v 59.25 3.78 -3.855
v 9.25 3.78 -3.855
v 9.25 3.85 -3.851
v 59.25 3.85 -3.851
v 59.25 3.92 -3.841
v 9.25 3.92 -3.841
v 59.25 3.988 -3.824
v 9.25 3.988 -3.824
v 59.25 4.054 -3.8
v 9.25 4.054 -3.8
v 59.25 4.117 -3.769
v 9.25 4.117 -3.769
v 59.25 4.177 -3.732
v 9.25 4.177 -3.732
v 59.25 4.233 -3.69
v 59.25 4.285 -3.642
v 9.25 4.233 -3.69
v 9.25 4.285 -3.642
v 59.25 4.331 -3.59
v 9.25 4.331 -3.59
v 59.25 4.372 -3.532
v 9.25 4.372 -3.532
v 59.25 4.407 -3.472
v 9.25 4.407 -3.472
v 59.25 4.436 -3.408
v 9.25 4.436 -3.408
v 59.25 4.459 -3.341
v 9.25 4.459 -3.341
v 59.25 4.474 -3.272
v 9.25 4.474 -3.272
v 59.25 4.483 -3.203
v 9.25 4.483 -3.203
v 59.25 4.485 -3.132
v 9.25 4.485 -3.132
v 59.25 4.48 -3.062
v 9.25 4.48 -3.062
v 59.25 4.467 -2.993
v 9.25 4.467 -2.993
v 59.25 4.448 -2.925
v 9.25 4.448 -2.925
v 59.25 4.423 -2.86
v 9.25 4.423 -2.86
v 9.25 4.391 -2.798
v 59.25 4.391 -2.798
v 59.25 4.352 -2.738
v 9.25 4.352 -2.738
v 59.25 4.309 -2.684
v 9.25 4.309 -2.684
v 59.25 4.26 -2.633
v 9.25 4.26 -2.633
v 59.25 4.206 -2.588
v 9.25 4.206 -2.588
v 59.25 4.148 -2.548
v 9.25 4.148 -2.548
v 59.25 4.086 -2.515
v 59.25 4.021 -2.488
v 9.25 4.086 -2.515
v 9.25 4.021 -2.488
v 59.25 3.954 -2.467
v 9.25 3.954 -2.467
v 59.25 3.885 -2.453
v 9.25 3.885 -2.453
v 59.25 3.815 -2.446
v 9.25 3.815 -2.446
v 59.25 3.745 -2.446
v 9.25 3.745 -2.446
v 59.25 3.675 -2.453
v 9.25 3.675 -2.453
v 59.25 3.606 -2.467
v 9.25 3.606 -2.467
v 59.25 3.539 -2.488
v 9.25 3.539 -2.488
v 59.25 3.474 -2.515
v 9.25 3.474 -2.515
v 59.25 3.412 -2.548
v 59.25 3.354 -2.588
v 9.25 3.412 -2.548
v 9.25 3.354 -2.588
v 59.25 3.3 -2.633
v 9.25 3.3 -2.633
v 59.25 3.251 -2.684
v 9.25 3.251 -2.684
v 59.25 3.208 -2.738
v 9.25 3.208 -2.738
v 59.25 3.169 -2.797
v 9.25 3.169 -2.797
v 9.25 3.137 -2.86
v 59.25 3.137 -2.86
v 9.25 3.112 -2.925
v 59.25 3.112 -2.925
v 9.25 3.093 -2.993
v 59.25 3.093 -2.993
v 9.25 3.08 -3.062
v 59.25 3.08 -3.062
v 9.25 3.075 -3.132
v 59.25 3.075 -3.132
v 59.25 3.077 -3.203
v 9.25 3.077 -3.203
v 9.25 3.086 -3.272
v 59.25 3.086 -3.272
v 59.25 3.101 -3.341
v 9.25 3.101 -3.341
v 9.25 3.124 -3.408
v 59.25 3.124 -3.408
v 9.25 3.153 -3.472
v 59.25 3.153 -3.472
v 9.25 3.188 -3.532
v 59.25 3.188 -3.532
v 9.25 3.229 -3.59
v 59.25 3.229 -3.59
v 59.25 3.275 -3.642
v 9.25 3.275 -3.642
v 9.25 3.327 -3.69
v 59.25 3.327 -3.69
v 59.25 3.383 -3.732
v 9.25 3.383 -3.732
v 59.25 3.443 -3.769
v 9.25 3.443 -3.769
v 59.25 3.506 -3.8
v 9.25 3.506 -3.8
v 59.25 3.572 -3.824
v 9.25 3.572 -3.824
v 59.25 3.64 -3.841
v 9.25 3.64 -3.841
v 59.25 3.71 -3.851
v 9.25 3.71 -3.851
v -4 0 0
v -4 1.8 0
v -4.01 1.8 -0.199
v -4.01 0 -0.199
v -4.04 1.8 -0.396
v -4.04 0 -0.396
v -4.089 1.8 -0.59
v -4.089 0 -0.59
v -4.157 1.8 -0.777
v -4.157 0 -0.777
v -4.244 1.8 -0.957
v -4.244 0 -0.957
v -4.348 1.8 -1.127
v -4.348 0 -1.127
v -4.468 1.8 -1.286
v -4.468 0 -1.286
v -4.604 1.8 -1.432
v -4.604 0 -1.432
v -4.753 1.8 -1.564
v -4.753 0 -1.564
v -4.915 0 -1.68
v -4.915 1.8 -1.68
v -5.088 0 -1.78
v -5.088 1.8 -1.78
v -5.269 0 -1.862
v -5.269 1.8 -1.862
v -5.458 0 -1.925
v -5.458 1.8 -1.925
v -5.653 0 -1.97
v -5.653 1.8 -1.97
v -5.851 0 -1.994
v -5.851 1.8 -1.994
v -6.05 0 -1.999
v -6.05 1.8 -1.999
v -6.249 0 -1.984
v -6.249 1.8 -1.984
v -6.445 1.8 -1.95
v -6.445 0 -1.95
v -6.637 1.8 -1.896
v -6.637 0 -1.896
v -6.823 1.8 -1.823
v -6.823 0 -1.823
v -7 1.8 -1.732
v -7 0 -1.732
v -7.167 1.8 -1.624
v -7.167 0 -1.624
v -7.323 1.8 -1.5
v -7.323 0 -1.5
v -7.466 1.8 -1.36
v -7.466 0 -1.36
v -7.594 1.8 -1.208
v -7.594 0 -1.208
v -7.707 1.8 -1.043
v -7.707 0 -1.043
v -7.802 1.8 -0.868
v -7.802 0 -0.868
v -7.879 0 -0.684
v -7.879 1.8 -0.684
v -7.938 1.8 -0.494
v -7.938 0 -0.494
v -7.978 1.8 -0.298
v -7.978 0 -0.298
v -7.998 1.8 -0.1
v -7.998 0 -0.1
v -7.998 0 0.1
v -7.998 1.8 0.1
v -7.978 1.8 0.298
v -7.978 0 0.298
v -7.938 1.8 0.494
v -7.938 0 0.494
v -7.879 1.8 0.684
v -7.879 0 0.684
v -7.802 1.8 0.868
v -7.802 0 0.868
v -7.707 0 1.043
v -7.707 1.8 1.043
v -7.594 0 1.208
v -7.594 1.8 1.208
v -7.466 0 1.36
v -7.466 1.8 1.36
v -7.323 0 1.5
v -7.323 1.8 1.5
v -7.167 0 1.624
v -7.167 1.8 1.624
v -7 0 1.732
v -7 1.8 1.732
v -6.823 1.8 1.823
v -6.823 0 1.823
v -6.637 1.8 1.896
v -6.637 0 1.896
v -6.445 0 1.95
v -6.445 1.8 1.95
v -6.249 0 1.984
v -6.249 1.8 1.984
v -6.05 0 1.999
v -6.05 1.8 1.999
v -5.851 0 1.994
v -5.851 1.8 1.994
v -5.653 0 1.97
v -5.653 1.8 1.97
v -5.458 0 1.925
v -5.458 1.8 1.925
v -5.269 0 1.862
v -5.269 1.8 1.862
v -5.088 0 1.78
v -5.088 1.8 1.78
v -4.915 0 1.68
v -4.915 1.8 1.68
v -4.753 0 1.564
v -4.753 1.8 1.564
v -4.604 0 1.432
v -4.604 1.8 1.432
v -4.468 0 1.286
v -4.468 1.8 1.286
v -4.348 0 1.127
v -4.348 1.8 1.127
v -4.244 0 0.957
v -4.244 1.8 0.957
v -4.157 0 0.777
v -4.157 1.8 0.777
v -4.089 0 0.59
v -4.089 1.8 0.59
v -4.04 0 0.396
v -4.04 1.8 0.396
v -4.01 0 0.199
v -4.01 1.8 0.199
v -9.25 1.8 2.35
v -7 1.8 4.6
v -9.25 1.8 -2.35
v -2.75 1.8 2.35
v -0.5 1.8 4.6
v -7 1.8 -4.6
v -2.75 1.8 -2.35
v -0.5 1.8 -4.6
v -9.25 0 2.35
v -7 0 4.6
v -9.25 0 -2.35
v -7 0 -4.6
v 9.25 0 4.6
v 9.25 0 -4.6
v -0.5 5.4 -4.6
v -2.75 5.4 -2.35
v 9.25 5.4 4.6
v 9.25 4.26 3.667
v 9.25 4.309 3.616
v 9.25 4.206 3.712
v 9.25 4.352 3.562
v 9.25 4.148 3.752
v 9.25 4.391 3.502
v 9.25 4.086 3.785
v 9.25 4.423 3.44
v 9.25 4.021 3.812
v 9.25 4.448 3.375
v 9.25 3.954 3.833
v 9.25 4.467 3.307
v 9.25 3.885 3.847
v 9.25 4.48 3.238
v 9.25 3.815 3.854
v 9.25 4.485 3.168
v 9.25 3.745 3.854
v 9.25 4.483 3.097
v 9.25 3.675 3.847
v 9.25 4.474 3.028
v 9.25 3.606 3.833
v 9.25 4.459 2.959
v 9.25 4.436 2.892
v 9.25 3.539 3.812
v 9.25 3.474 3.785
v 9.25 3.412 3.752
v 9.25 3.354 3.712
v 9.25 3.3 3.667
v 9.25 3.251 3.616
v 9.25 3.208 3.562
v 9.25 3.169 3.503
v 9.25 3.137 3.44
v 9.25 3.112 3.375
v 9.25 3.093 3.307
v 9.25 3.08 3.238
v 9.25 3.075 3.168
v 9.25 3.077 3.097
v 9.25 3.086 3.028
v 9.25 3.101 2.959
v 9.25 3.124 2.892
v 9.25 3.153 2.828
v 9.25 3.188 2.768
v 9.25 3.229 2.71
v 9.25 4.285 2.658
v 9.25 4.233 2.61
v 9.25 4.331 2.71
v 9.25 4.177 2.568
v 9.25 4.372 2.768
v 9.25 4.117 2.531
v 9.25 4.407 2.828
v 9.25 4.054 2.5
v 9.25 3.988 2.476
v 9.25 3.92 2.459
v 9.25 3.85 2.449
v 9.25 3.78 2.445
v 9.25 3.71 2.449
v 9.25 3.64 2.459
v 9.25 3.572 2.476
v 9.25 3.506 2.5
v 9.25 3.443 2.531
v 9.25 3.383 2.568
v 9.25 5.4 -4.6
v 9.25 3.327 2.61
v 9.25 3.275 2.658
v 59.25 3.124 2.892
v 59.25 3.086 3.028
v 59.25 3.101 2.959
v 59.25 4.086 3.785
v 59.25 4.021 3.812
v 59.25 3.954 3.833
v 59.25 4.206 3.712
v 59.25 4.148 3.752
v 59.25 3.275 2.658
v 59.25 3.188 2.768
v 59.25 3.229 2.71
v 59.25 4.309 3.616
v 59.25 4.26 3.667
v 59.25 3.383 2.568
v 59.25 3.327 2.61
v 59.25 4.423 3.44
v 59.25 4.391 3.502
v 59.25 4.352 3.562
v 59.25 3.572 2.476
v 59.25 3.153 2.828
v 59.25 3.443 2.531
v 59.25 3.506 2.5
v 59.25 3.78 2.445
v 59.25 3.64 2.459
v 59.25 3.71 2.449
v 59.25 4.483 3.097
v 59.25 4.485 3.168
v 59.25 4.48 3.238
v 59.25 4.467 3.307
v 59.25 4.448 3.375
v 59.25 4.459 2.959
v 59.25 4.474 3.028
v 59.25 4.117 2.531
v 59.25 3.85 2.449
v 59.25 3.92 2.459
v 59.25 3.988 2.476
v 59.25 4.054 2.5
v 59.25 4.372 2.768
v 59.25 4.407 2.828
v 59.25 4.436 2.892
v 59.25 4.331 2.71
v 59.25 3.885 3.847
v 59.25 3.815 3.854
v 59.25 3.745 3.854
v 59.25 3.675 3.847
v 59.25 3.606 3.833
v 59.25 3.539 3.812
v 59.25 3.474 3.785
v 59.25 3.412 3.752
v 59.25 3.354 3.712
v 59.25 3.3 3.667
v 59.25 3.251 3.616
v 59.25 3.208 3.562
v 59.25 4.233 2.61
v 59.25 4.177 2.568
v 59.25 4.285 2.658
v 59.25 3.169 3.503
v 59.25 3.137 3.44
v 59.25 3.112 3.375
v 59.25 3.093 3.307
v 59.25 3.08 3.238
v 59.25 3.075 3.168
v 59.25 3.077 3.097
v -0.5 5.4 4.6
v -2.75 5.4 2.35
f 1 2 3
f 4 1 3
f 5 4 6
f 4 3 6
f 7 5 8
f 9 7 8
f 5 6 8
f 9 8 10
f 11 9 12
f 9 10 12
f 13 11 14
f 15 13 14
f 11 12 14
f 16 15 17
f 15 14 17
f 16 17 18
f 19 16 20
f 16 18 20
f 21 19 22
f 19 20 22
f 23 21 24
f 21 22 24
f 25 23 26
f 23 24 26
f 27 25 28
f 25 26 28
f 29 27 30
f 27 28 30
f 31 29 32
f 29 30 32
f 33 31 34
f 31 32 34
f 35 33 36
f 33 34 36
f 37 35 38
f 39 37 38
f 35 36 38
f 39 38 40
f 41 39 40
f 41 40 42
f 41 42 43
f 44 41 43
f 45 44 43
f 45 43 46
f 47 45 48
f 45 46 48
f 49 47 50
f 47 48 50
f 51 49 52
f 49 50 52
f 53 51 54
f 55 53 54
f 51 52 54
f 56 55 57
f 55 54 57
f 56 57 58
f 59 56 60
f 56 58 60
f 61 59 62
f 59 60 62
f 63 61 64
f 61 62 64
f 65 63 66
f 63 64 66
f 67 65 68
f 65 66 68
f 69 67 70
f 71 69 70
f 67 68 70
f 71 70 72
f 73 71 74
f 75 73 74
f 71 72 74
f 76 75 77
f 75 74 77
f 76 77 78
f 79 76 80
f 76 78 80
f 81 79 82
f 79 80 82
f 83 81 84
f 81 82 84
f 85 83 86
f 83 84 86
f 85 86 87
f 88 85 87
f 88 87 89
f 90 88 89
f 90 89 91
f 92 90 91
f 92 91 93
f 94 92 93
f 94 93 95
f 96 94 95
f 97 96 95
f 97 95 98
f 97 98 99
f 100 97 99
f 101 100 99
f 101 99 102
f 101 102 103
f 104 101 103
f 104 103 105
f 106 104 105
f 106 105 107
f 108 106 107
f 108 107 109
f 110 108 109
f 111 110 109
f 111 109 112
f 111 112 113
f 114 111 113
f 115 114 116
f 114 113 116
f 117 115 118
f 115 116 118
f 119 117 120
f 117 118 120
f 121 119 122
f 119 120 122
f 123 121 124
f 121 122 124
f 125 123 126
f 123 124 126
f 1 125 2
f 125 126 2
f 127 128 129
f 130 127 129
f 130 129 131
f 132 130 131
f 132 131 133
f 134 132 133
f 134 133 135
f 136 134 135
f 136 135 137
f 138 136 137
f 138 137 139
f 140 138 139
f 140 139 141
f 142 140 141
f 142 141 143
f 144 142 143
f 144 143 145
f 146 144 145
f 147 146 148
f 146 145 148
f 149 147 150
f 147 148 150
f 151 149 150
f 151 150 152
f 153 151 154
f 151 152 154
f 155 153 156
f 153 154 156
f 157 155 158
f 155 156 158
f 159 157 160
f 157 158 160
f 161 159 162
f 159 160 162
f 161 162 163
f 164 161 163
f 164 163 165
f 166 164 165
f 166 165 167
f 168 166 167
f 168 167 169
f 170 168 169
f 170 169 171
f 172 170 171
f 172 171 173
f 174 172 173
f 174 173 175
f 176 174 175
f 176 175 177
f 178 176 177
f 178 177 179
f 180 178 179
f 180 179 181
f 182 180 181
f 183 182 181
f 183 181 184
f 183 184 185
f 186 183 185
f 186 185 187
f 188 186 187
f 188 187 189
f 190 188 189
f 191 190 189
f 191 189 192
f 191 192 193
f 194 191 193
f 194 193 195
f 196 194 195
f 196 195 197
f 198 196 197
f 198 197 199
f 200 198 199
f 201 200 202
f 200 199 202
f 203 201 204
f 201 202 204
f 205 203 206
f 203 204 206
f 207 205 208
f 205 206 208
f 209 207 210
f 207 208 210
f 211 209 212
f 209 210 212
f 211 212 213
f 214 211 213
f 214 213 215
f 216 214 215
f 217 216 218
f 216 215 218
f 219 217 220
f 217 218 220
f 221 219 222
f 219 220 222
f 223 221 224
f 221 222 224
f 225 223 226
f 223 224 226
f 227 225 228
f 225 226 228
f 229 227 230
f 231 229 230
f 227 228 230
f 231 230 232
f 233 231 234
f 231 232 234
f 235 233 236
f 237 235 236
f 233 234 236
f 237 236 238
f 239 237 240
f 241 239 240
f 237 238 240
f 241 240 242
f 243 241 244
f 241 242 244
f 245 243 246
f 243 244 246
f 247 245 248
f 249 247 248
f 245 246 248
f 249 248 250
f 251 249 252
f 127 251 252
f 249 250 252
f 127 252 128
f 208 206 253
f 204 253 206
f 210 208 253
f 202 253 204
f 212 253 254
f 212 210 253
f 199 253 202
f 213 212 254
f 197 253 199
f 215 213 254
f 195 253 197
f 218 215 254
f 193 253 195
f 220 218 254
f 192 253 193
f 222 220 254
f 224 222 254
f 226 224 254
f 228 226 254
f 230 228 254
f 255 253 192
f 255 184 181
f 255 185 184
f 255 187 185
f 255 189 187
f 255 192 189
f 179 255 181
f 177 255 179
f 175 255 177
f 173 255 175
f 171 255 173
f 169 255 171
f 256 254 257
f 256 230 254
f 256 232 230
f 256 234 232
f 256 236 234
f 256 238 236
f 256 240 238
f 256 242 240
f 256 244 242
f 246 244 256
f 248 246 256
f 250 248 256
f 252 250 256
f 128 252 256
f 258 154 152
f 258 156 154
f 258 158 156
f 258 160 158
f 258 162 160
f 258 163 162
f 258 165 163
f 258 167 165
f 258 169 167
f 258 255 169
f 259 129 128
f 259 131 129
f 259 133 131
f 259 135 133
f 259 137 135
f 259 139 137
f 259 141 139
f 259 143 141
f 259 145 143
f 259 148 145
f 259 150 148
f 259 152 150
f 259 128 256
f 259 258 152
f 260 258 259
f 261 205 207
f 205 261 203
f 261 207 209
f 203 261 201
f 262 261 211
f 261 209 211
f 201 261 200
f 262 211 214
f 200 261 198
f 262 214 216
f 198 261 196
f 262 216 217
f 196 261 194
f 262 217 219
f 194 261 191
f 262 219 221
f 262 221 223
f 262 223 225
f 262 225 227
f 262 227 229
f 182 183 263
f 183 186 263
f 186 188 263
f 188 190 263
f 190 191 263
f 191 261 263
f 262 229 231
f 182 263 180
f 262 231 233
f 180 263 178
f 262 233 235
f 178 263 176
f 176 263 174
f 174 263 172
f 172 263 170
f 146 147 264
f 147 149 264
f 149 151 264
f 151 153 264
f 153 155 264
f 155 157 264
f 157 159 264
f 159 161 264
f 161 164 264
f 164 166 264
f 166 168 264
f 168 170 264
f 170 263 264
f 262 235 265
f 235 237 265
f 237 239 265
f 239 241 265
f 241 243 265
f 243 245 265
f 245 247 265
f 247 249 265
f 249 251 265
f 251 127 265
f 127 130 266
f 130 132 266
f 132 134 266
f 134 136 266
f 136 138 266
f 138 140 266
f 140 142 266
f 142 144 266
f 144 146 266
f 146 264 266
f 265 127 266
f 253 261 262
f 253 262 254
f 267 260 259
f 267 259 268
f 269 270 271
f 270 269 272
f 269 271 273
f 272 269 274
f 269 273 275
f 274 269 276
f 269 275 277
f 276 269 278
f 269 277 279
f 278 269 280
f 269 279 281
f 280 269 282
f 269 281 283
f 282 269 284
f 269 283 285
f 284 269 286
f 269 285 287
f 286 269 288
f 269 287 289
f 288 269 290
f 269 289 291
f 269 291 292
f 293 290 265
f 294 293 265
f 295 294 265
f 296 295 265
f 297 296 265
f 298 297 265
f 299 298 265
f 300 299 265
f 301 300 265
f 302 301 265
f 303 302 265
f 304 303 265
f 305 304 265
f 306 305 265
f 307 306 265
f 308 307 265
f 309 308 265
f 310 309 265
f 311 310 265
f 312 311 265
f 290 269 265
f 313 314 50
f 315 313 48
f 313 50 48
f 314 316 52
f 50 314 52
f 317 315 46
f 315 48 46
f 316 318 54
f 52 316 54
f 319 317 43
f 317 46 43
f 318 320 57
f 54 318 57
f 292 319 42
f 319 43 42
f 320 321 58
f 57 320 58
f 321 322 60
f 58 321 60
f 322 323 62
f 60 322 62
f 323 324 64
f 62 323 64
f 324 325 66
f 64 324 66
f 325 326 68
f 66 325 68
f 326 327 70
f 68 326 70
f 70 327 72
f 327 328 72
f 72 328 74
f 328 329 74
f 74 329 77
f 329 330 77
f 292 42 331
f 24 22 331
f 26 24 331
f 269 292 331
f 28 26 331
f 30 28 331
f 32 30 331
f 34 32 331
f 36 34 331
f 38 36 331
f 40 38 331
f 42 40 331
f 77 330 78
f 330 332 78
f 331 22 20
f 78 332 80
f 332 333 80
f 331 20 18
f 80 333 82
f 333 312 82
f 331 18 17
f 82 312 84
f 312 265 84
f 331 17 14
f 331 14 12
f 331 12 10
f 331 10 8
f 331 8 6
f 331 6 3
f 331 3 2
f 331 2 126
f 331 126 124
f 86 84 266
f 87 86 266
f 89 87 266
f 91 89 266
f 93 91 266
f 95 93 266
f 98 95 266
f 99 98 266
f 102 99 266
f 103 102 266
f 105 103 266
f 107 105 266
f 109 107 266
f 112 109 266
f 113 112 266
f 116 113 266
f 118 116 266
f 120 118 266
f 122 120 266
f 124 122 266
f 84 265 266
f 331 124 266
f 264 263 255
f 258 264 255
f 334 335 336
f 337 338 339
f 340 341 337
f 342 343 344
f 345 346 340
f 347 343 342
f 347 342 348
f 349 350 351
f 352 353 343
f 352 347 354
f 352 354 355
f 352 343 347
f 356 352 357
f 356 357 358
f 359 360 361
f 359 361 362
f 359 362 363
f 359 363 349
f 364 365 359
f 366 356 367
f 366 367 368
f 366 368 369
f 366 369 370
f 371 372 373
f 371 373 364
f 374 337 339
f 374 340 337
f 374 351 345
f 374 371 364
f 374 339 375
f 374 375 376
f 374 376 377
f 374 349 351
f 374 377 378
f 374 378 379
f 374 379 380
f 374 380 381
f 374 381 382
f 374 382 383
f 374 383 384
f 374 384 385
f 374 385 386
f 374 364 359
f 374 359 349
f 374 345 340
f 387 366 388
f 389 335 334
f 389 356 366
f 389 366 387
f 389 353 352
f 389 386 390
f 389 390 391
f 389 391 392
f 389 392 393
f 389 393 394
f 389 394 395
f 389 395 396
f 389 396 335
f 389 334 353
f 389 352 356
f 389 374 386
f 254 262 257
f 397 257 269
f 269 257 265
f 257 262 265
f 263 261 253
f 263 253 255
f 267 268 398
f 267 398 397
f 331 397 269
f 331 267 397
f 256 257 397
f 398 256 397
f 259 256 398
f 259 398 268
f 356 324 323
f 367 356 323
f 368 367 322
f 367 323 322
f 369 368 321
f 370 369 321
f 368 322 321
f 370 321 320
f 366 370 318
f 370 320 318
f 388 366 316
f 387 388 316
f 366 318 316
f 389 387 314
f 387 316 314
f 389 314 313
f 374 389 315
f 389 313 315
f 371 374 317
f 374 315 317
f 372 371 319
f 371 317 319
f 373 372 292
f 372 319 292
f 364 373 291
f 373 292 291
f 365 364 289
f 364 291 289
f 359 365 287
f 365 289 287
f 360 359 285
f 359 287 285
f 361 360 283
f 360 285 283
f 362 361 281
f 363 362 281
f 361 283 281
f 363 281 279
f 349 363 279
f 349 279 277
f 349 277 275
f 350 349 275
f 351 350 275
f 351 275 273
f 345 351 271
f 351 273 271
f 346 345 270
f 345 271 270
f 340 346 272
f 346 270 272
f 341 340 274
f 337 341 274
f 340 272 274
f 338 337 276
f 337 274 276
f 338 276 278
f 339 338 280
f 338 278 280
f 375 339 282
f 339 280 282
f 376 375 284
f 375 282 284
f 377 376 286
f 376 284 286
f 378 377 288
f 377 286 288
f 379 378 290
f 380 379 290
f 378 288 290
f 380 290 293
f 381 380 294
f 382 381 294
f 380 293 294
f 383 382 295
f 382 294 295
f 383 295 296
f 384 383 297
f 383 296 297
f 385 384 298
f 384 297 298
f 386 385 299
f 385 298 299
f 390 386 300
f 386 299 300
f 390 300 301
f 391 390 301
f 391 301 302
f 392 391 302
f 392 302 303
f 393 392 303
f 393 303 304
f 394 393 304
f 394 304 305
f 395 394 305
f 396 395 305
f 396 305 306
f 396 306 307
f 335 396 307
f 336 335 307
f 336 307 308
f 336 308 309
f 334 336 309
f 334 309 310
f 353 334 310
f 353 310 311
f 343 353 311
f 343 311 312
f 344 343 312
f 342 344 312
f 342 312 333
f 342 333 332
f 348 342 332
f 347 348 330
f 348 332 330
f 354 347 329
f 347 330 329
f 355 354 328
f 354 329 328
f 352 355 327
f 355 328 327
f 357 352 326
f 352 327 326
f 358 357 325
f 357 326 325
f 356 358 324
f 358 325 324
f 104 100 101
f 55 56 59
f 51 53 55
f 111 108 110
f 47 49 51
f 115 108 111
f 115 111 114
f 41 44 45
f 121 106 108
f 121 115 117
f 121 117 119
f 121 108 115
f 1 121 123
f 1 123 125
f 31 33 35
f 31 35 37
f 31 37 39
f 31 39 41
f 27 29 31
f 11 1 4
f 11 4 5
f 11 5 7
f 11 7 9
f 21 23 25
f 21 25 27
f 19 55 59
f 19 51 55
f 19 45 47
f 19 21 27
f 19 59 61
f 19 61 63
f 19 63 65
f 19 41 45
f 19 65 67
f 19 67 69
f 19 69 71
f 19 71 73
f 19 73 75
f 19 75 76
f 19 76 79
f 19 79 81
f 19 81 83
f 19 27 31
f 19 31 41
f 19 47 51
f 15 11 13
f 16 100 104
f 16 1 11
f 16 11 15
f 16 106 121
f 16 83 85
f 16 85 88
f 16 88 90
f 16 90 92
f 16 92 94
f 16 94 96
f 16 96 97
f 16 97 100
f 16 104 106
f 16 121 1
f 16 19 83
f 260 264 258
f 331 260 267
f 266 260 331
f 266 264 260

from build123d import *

# Parameters (mm, degrees)
SKETCH1_W           = 18.5
SKETCH1_H           = 9.2
BOSS_EXTRUDE1_DEPTH = 1.8
SKETCH3_W           = 12
SKETCH3_H           = 9.2
BOSS_EXTRUDE3_DEPTH = 3.6
SKETCH2_R           = 0.705
BOSS_EXTRUDE2_DEPTH = 50
SKETCH4_R           = 2
CUT_EXTRUDE1_DEPTH  = 2.8
CHAMFER1_SIZE       = 2.25


with BuildPart() as part:
    # Sketch1 → Boss-Extrude1 (new body)
    with BuildSketch(Plane(origin=(0, 0, 0), x_dir=(1, 0, 0), z_dir=(0, 1, 0))):
        Rectangle(SKETCH1_W, SKETCH1_H)
    extrude(amount=BOSS_EXTRUDE1_DEPTH)

    # Sketch3 → Boss-Extrude3 (add)
    with BuildSketch(Plane(origin=(0, 1.8, 0), x_dir=(1, 0, 0), z_dir=(0, 1, 0))):
        with Locations((3.25, 0)):
            Rectangle(SKETCH3_W, SKETCH3_H)
    extrude(amount=BOSS_EXTRUDE3_DEPTH)

    # Sketch2 → Boss-Extrude2 (add)
    with BuildSketch(Plane(origin=(9.25, 0, 0), x_dir=(0, 0, -1), z_dir=(1, 0, 0))):
        with Locations((-3.15, 3.78)):
            Circle(SKETCH2_R)
        with Locations((3.15, 3.78)):
            Circle(SKETCH2_R)
    extrude(amount=BOSS_EXTRUDE2_DEPTH)

    # Sketch4 → Cut-Extrude1 (cut, through all)
    with BuildSketch(Plane(origin=(0, 1.8, 0), x_dir=(1, 0, 0), z_dir=(0, 1, 0))):
        with Locations((-6, 0)):
            Circle(SKETCH4_R)
    extrude(amount=-CUT_EXTRUDE1_DEPTH, mode=Mode.SUBTRACT)

    # Chamfer1
    chamfer1_edges = [part.edges().sort_by_distance(p)[0] for p in [
        (-9.25, 0.9, -4.6),
        (-9.25, 0.9, 4.6),
        (-2.75, 3.6, -4.6),
        (-2.75, 3.6, 4.6),
    ]]
    chamfer(chamfer1_edges, length=CHAMFER1_SIZE)


solid = part.part
